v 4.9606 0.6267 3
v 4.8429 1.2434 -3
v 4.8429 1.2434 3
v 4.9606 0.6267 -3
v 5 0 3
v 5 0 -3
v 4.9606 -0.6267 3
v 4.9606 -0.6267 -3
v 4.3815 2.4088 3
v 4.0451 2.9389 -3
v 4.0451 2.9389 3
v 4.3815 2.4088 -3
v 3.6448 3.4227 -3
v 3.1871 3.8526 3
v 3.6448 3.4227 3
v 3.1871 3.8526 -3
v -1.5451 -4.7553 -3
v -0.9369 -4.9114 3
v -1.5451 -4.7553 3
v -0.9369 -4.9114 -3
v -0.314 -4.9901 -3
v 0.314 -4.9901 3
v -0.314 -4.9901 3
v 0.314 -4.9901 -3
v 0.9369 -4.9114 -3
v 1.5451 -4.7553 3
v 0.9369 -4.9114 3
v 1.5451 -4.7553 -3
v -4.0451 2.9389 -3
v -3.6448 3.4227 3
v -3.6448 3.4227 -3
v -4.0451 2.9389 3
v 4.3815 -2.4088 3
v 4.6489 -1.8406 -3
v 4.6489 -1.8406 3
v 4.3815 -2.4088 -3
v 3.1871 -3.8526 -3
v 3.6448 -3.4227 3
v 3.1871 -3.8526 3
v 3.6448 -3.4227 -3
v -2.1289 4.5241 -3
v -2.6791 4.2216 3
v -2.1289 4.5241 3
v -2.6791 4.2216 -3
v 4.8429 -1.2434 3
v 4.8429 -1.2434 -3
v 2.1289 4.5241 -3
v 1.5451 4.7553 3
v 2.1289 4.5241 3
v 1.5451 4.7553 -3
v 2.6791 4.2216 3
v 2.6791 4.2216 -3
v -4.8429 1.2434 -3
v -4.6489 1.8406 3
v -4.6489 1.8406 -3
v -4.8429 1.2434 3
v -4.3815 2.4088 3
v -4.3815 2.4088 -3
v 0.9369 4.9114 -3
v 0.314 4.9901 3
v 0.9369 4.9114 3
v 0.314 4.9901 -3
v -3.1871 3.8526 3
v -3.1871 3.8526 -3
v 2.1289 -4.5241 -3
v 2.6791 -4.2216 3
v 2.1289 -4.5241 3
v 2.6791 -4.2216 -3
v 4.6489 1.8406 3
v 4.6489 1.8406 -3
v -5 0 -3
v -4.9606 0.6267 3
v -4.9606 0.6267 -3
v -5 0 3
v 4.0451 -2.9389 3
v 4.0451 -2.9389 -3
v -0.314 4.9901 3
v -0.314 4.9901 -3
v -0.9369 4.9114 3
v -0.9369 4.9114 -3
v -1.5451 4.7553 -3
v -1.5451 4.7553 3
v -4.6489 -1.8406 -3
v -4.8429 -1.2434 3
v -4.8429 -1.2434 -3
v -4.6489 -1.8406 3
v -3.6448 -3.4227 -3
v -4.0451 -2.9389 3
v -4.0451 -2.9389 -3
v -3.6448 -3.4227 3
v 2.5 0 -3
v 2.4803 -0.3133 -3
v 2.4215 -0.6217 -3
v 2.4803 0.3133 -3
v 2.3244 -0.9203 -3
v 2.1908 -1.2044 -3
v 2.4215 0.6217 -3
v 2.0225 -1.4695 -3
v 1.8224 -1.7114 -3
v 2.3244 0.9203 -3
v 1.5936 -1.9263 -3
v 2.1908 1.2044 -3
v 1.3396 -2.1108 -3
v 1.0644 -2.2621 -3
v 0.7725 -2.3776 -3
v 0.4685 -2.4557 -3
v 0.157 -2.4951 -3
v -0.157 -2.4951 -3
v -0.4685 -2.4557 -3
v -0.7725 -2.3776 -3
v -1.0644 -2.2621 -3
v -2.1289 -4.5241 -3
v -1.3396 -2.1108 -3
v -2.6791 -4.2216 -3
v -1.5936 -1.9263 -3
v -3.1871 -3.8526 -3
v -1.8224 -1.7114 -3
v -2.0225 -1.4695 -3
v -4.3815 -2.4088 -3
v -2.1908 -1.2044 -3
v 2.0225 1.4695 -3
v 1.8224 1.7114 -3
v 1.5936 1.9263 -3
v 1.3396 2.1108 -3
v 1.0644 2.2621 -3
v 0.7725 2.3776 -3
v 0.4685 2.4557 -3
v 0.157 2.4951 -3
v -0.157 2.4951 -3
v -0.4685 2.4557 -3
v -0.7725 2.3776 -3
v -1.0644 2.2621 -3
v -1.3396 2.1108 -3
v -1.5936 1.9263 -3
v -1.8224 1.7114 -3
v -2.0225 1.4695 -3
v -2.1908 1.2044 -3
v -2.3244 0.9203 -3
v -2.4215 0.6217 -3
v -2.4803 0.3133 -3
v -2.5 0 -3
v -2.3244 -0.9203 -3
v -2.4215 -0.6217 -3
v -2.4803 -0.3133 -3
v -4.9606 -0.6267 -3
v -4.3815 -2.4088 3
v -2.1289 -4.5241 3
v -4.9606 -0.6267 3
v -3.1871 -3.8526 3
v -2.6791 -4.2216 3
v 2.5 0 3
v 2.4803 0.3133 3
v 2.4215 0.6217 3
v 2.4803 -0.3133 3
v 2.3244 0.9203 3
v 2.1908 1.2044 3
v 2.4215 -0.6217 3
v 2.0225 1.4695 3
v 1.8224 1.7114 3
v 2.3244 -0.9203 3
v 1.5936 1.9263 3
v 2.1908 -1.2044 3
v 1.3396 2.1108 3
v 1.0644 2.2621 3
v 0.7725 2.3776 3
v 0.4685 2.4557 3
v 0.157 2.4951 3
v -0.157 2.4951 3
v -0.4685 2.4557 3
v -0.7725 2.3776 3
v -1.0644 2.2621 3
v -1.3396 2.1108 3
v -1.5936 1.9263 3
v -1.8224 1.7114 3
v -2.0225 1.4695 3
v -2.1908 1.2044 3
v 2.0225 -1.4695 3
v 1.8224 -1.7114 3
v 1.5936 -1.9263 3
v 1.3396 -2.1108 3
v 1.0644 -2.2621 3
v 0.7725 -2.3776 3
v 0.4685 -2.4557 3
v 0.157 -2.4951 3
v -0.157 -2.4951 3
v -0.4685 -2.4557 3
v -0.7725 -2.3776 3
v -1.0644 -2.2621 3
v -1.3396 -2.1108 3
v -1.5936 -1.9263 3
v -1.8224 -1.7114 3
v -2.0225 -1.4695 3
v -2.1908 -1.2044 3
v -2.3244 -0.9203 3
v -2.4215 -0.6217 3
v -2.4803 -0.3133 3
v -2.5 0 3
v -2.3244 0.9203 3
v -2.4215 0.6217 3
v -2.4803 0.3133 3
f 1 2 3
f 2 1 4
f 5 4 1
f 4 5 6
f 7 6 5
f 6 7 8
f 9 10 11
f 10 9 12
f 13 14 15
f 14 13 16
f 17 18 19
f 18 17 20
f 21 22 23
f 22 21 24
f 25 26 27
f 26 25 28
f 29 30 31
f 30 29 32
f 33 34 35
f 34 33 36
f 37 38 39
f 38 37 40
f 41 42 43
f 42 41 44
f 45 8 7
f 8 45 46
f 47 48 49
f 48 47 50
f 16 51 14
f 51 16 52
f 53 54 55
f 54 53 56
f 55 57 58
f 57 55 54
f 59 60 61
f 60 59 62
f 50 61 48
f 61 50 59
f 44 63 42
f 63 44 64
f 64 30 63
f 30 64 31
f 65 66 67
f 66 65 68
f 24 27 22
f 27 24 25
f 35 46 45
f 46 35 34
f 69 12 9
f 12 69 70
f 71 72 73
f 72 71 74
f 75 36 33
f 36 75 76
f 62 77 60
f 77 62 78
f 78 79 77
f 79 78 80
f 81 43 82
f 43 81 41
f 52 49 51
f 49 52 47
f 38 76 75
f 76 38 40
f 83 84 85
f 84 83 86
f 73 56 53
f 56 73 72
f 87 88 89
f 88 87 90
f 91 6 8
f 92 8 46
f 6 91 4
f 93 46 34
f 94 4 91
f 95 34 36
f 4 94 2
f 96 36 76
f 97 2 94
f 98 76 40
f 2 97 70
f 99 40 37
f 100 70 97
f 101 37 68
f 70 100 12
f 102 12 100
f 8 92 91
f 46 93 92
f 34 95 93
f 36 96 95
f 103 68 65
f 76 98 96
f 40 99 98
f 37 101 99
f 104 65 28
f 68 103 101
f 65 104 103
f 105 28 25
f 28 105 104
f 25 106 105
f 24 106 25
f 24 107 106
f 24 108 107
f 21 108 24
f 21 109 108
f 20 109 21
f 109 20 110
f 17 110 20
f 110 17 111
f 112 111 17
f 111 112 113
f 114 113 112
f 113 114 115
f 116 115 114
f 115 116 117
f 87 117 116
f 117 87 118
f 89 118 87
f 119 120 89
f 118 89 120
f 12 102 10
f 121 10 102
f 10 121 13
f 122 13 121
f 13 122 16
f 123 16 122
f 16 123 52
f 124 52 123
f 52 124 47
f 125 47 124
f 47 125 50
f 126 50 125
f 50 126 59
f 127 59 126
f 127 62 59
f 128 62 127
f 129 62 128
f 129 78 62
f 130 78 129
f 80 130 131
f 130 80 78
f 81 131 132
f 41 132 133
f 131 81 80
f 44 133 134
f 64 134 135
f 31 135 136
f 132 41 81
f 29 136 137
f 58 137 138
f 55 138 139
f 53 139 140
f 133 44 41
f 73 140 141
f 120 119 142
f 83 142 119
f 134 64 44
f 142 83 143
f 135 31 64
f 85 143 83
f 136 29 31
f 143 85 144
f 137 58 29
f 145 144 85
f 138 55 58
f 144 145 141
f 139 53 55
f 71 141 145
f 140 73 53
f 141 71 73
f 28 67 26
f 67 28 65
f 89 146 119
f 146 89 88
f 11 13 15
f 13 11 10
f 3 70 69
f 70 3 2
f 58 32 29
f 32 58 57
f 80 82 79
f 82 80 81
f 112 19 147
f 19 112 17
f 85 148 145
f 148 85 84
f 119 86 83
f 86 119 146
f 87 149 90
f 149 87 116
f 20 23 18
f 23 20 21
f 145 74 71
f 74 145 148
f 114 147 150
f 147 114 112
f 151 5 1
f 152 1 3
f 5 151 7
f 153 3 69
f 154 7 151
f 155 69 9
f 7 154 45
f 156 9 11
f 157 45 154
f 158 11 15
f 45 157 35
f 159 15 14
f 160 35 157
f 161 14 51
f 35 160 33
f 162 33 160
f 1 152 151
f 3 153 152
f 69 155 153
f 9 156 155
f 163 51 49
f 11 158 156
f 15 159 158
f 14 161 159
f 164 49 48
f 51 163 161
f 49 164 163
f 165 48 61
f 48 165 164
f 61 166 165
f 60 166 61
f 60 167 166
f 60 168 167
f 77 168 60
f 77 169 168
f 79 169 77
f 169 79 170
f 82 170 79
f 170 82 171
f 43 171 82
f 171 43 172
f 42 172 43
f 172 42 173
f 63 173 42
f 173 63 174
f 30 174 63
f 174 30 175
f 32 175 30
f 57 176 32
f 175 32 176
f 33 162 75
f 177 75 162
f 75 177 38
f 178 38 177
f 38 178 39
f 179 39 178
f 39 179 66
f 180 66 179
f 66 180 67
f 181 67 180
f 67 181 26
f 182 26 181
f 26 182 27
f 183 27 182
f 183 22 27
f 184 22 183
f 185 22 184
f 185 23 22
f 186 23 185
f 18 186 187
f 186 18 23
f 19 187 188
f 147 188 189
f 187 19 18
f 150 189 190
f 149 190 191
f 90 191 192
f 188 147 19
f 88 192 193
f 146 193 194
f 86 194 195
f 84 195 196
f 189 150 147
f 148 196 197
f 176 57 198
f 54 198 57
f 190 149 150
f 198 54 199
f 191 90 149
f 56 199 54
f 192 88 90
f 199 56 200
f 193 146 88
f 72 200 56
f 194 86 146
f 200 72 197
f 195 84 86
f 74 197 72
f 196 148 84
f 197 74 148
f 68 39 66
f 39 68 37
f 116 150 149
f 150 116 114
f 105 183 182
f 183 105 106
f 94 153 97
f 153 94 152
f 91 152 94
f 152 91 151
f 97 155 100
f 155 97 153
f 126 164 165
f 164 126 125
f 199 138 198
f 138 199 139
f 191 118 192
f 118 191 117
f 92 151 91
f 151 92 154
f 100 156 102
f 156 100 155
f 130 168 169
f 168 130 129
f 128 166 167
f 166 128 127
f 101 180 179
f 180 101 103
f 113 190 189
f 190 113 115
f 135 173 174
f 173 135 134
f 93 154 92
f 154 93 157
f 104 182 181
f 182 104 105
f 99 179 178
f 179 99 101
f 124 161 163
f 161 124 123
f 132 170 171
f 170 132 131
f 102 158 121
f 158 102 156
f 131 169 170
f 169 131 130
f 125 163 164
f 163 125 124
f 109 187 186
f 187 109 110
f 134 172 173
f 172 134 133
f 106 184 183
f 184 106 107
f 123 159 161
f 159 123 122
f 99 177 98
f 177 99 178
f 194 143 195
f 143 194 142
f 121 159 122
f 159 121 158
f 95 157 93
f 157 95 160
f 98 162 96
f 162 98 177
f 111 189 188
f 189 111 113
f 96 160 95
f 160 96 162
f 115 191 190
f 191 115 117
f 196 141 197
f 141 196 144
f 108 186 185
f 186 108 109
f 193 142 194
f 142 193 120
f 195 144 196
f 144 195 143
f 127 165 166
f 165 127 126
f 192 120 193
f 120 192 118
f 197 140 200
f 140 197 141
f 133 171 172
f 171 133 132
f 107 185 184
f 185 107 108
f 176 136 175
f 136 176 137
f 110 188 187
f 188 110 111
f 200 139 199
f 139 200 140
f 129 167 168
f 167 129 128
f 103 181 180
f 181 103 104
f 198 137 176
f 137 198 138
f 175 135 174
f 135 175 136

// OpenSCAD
$fn = 50;


difference() {
	union() {
		translate(v = [0, 0, -3.0000000000]) {
			cylinder(h = 6, r = 5.0000000000);
		}
	}
	union() {
		translate(v = [0, 0, -100.0000000000]) {
			cylinder(h = 200, r = 2.5000000000);
		}
	}
}
